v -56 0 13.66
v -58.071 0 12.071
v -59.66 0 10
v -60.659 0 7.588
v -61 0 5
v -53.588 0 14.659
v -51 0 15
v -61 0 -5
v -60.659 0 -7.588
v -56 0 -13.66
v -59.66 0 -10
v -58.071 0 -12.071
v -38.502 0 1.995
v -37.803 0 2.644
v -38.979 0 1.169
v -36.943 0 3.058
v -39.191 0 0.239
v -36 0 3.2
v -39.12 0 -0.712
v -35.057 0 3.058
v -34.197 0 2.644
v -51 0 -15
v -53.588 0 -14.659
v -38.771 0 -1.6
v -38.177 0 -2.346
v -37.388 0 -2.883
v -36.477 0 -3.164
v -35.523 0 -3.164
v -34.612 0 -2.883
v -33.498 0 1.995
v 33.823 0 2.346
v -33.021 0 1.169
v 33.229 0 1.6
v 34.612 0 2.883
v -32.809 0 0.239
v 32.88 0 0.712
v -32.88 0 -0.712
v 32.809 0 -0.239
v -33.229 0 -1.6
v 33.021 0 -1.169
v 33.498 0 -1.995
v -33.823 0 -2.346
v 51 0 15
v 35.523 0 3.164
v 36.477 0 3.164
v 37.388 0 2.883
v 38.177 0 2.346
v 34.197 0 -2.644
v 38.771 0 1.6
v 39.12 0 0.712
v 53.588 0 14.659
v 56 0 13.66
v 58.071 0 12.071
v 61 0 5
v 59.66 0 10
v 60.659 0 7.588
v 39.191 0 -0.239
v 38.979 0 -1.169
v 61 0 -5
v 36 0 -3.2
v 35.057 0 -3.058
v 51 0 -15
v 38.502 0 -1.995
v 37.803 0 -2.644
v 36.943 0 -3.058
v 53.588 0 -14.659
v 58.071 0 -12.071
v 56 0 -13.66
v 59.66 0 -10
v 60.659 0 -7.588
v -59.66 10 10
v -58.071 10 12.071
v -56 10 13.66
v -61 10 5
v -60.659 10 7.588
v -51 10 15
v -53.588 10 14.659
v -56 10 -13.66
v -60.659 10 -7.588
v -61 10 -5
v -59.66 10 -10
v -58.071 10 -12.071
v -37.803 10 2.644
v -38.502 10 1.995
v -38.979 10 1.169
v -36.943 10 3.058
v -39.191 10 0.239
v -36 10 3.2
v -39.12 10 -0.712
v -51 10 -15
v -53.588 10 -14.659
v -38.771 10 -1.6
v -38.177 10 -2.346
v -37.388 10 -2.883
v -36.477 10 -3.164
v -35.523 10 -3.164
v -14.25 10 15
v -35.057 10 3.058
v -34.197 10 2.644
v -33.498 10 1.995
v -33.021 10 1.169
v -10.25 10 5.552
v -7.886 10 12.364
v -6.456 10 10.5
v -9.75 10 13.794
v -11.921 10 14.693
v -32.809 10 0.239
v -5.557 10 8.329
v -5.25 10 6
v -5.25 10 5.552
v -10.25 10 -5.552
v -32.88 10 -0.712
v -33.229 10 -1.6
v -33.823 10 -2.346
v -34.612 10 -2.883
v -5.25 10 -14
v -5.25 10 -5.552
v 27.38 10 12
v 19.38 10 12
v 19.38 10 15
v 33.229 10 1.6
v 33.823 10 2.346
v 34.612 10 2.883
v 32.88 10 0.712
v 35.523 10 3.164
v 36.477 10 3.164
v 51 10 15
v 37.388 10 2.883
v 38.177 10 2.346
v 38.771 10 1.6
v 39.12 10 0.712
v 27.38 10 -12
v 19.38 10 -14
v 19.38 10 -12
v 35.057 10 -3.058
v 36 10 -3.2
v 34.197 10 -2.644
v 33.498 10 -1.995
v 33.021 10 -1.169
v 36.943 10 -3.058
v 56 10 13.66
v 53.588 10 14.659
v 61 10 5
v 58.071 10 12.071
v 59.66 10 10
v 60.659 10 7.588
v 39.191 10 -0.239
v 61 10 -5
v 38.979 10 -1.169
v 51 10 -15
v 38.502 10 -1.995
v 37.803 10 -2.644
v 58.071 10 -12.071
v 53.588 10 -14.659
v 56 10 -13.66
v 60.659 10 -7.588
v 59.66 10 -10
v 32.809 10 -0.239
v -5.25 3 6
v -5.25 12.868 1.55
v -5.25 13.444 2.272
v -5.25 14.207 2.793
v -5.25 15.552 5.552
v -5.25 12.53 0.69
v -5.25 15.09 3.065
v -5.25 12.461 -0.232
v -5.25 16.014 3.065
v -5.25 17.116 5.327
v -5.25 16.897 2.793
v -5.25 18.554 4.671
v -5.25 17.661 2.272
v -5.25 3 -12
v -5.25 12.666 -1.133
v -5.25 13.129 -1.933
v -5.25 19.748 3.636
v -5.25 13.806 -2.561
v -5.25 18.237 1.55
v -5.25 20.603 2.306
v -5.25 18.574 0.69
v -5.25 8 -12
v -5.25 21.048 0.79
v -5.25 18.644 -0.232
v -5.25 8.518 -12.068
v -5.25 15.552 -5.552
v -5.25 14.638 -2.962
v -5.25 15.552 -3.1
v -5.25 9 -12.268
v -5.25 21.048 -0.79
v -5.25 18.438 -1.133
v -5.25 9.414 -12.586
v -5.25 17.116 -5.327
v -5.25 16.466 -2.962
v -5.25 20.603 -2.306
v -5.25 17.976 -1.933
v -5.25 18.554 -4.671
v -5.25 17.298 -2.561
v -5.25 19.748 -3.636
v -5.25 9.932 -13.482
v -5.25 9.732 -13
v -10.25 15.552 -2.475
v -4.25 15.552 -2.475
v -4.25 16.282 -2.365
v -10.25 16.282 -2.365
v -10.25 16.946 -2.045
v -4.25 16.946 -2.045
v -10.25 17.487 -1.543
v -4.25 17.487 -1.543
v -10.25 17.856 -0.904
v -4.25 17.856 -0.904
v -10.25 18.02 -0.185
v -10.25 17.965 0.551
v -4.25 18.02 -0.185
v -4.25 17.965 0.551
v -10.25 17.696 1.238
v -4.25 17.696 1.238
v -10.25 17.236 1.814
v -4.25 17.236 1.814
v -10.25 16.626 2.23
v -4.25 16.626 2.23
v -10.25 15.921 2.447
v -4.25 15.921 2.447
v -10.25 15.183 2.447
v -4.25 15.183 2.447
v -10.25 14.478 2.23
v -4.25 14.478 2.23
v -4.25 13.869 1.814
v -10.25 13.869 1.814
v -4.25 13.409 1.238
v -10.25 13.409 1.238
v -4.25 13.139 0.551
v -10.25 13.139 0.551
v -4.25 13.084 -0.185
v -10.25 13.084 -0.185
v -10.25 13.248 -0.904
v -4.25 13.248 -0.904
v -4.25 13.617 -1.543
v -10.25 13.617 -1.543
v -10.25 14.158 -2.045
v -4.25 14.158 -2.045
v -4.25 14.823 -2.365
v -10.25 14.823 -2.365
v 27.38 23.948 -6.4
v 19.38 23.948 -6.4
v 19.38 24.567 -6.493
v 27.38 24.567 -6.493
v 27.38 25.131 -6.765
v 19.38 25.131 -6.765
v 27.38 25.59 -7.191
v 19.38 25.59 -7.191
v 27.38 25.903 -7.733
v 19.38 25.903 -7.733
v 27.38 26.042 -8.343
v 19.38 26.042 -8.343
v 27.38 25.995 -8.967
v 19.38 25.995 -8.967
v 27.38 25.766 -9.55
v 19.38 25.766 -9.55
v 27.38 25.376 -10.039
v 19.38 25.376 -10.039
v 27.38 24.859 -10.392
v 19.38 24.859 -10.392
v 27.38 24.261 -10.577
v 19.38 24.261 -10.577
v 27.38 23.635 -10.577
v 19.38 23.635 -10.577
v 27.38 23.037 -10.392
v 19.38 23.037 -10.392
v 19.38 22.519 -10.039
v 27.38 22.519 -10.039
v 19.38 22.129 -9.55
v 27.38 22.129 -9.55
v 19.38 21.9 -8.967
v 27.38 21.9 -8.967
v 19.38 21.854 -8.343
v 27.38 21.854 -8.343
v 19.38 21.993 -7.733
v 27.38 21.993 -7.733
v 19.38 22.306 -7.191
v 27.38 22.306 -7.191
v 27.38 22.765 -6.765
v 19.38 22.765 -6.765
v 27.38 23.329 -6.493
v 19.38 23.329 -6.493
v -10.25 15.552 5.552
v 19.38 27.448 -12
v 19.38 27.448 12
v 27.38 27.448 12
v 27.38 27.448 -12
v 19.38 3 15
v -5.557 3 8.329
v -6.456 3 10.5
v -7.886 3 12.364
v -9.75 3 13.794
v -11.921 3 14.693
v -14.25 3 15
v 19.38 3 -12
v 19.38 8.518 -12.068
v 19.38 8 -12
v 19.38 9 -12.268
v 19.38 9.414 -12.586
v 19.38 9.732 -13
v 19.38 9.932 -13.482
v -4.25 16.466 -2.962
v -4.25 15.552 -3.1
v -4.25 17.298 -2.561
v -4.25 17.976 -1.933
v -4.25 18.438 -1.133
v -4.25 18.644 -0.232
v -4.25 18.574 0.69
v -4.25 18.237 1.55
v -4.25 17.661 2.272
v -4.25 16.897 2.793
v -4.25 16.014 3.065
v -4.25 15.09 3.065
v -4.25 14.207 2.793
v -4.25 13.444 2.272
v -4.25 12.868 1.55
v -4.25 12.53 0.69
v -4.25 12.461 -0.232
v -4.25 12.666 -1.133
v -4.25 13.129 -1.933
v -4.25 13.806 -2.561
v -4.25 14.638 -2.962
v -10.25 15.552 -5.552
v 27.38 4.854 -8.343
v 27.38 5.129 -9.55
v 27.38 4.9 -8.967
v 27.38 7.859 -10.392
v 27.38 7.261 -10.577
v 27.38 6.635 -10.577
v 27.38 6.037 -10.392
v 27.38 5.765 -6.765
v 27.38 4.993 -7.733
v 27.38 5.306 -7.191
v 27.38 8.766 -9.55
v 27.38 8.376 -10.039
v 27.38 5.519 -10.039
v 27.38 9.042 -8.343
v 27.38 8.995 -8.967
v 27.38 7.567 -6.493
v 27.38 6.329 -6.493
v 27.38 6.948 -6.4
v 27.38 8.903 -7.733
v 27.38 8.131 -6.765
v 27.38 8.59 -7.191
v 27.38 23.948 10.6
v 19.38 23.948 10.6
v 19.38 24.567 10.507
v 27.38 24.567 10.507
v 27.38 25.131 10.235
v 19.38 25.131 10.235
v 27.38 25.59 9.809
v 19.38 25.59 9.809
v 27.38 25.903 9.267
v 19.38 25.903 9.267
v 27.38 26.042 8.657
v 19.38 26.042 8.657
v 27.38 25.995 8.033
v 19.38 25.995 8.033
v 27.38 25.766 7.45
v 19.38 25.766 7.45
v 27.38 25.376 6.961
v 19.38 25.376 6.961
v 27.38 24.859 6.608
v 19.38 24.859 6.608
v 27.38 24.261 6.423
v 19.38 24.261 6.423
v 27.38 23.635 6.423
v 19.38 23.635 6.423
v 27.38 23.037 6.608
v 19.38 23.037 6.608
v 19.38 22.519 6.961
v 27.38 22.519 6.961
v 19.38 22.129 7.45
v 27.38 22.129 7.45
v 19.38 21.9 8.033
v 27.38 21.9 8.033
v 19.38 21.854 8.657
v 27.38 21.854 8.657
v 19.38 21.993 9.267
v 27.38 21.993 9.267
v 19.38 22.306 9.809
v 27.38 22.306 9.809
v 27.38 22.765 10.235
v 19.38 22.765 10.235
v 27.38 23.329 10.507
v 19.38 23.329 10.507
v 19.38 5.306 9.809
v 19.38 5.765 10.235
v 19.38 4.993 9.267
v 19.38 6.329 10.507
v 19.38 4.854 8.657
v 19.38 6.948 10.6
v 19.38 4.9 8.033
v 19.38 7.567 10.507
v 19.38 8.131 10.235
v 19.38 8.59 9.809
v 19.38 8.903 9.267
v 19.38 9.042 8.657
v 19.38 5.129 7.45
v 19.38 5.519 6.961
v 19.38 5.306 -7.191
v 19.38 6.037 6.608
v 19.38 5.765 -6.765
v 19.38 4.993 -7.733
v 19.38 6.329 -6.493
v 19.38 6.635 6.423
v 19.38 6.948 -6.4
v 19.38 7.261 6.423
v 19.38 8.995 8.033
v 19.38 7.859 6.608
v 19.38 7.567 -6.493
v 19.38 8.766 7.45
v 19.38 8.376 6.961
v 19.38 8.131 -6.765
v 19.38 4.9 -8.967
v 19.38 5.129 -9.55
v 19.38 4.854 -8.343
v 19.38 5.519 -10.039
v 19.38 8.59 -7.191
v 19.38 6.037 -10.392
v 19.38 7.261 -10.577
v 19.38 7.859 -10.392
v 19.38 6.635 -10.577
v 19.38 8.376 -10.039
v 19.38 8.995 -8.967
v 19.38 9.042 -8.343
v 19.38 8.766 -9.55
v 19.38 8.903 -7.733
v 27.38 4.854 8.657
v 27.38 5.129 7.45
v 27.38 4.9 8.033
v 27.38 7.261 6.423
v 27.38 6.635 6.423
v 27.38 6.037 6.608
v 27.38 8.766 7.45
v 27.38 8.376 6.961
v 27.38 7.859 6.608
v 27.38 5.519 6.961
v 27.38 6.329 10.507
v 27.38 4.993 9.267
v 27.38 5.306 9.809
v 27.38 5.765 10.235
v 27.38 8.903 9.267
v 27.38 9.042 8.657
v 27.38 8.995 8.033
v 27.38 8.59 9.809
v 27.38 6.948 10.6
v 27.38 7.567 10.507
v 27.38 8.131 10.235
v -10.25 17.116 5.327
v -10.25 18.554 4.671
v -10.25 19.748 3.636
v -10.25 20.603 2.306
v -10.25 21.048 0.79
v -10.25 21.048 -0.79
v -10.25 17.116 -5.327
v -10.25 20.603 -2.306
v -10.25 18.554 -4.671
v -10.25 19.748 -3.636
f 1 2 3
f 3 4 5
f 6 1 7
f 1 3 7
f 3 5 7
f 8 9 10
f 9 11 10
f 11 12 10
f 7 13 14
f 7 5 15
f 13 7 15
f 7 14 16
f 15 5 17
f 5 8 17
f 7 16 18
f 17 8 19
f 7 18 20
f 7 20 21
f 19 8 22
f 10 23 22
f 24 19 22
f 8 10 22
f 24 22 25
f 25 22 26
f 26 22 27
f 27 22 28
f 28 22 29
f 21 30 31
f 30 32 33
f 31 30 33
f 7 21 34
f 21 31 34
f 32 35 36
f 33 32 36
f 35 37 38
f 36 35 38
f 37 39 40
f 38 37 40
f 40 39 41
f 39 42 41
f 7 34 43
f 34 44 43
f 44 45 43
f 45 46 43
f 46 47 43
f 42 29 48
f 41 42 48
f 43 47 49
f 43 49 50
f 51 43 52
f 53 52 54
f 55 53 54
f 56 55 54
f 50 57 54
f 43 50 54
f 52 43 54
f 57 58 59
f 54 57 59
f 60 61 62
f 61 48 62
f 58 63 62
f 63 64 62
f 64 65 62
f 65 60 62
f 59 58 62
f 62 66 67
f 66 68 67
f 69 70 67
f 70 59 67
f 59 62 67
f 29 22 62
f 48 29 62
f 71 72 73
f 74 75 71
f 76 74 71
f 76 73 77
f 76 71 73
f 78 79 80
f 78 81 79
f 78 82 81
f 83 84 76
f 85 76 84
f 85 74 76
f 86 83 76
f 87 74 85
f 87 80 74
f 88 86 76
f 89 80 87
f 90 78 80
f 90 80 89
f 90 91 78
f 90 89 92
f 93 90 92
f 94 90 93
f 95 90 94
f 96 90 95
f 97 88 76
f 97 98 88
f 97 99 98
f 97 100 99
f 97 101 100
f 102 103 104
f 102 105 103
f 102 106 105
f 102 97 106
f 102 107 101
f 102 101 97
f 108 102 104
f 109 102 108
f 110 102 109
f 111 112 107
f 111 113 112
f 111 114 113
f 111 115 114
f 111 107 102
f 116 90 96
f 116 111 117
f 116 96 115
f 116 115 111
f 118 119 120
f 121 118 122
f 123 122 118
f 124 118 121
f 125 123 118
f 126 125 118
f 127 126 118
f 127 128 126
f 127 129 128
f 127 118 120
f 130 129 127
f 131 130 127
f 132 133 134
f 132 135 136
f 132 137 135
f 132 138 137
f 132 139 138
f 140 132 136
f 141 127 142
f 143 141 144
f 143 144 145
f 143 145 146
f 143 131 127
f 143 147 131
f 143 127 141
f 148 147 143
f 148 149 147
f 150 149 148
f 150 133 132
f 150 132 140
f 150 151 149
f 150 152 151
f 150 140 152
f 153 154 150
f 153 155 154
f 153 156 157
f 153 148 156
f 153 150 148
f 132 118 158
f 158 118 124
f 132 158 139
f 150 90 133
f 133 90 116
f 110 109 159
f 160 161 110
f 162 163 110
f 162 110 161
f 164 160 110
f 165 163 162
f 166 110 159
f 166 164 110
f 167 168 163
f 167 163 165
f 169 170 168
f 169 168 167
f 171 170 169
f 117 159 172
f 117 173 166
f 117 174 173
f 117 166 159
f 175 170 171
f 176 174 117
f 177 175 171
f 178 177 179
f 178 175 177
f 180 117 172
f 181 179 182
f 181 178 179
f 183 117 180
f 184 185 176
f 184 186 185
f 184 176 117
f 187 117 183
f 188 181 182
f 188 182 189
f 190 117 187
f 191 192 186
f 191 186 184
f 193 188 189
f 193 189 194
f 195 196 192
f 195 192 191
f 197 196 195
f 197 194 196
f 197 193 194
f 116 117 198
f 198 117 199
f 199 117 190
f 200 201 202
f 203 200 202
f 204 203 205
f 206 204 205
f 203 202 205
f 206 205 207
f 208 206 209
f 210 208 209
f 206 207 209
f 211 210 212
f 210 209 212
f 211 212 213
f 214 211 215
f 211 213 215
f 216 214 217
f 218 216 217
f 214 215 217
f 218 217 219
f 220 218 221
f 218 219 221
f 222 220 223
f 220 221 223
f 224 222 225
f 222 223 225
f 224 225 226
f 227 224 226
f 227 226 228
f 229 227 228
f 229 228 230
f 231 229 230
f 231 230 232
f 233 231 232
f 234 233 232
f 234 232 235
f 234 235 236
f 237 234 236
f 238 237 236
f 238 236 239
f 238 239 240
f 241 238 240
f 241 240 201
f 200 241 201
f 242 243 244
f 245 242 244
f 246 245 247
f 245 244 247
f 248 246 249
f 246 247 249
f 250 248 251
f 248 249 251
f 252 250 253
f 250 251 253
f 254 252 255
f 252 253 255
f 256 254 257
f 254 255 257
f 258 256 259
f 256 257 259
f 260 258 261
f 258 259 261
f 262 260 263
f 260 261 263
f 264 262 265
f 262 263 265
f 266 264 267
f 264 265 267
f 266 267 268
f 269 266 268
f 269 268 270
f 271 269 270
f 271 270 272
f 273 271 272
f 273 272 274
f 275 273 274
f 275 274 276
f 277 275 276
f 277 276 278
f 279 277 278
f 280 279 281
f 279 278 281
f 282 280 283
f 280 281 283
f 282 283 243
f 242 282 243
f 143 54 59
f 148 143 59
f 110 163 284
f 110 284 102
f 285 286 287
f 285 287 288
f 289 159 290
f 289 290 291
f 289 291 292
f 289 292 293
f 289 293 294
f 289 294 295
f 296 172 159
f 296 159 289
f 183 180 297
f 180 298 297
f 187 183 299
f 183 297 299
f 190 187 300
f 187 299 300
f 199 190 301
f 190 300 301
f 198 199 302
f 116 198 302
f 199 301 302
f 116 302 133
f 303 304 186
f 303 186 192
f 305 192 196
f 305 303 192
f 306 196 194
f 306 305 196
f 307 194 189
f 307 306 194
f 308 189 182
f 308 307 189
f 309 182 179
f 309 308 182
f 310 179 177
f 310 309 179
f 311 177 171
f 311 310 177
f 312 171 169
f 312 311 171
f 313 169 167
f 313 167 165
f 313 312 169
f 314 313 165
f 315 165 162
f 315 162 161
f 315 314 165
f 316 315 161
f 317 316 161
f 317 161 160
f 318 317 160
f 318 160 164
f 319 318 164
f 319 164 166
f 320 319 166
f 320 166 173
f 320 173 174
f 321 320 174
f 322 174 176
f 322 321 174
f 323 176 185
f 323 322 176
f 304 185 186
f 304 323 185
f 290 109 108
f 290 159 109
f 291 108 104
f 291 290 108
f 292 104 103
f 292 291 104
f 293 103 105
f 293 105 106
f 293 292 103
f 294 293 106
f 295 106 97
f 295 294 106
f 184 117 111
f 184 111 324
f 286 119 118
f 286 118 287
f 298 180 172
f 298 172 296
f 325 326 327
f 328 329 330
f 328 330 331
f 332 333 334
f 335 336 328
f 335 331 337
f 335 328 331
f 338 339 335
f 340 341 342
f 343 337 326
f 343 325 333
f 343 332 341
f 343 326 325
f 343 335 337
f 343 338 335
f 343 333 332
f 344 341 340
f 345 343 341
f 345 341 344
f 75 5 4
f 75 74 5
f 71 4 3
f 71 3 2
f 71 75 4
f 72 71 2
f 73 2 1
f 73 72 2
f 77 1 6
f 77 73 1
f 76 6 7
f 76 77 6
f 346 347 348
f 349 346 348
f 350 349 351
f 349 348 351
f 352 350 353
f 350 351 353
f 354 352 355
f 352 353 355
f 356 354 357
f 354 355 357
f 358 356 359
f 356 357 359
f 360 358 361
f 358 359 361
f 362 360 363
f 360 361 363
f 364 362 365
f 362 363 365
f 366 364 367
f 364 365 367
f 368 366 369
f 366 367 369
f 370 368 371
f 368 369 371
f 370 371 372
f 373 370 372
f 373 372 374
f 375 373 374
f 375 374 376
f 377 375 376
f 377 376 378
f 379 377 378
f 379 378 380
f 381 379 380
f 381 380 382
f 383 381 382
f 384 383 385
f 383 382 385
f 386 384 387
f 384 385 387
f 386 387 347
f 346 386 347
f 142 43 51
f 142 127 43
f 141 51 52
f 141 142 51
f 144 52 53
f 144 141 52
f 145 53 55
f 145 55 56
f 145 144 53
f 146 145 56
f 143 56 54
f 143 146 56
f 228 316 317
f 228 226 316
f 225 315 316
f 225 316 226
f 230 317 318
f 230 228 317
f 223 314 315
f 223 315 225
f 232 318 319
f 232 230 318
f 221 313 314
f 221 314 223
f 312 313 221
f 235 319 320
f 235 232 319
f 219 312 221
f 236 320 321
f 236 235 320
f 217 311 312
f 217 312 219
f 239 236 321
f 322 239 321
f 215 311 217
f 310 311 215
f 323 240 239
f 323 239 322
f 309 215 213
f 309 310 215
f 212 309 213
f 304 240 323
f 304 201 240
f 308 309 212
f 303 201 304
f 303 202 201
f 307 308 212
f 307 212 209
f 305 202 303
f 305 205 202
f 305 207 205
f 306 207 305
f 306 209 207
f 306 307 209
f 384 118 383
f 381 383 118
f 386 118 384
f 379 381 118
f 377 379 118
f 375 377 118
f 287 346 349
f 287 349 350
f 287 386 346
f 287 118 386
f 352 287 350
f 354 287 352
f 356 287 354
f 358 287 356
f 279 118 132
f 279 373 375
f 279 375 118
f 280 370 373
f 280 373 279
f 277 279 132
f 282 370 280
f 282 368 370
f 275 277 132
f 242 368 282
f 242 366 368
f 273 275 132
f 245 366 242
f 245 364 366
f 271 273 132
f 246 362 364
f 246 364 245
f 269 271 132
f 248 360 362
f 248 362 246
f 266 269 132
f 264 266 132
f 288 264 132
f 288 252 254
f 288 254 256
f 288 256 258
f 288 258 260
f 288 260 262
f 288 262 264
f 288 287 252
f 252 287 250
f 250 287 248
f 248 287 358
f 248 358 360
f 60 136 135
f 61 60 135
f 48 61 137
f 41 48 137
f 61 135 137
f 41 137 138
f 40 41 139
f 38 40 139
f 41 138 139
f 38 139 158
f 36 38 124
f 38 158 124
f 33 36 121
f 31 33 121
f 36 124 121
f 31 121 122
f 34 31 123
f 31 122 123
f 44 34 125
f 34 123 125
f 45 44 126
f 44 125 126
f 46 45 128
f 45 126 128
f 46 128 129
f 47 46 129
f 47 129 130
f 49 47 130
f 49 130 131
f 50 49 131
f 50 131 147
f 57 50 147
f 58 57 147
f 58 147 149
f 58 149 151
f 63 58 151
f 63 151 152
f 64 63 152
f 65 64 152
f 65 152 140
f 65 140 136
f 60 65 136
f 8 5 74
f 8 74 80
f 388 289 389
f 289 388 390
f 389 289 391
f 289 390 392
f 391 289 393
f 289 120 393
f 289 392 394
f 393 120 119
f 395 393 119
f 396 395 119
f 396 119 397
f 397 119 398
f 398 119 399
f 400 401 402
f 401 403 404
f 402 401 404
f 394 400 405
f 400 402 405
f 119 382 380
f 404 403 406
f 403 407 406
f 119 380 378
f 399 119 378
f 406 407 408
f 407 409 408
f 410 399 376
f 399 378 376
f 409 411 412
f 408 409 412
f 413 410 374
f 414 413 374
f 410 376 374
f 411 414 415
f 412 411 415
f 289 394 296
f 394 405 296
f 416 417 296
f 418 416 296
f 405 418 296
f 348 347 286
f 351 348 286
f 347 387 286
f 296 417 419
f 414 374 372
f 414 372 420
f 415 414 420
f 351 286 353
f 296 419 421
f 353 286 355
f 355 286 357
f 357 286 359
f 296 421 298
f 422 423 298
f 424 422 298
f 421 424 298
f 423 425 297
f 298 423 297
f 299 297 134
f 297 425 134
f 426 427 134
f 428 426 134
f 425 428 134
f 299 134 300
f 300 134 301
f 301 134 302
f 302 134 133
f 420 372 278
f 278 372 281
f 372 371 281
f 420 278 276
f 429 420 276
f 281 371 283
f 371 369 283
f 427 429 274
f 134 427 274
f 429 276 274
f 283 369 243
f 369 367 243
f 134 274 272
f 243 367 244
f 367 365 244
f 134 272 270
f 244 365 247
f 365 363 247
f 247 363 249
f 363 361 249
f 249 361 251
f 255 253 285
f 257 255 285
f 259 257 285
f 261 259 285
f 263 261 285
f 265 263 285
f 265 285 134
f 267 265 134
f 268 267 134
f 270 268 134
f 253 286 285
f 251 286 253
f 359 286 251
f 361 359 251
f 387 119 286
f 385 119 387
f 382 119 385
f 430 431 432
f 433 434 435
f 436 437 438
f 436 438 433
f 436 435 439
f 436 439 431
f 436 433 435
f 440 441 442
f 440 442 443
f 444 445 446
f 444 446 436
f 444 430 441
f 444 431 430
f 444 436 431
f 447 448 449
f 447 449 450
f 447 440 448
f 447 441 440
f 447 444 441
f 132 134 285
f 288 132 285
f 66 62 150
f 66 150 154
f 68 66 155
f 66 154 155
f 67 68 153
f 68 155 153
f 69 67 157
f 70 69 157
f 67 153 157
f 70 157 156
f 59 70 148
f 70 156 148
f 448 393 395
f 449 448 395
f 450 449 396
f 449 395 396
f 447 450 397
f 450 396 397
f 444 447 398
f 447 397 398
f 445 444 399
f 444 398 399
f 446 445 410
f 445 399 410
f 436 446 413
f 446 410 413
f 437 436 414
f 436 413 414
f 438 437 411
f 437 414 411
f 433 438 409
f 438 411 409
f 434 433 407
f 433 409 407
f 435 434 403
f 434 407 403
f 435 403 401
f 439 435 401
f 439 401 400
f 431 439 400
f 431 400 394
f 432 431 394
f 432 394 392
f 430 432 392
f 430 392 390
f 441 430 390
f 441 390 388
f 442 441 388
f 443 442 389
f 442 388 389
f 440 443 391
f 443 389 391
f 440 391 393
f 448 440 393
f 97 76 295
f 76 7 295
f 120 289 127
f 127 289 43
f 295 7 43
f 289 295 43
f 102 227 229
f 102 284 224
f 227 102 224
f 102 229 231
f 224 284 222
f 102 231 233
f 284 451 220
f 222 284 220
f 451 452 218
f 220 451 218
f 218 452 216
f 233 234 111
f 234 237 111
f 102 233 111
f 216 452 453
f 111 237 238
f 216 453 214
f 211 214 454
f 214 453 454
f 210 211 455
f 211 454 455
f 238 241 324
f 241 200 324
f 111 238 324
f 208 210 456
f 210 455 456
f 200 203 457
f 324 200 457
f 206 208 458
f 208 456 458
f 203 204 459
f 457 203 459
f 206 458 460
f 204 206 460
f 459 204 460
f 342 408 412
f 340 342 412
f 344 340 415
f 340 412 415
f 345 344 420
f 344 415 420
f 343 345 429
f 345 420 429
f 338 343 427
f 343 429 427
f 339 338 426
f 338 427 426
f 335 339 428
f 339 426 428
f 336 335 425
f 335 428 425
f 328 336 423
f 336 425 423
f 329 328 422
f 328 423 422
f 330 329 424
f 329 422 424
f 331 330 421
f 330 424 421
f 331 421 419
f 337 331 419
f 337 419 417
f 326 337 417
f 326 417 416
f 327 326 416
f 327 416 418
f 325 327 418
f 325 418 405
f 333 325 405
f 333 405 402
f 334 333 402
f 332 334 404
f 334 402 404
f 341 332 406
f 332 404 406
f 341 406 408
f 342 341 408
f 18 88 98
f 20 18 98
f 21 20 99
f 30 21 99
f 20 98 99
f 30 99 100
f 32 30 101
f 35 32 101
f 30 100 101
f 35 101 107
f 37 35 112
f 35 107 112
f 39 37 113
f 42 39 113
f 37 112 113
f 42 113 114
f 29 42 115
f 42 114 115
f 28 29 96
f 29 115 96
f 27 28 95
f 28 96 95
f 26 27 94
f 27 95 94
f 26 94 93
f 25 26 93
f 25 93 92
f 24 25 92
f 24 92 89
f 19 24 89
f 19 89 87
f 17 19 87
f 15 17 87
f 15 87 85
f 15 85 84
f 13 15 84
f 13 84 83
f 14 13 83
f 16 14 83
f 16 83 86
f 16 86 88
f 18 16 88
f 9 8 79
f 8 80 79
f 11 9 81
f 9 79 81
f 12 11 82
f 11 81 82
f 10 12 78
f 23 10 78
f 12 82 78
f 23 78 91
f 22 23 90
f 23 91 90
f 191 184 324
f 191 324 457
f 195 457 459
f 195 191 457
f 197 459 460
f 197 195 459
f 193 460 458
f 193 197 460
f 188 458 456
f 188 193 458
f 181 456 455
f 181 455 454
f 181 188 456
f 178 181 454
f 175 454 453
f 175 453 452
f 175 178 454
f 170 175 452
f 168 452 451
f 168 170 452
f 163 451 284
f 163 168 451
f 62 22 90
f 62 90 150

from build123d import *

# Parameters (mm, degrees)
SKETCH1_W           = 122
SKETCH1_H           = 30
BOSS_EXTRUDE1_DEPTH = 10
SKETCH2_W           = 24
SKETCH2_H           = 17.447802
BOSS_EXTRUDE2_DEPTH = 8
SKETCH3_R           = 2.475
BOSS_EXTRUDE3_DEPTH = 5
SKETCH4_W           = 24.63
SKETCH4_H           = 27
CUT_EXTRUDE1_DEPTH  = 7
FILLET1_R           = 10
SKETCH7_R           = 3.2
CUT_EXTRUDE2_DEPTH  = 66.195289666
BOSS_EXTRUDE5_START = 1
SKETCH8_R           = 3.1
SKETCH8_R_2         = 2.475
BOSS_EXTRUDE5_DEPTH = 1
FILLET2_R           = 9
FILLET3_R           = 2
SKETCH9_R           = 2.1
CUT_EXTRUDE3_DEPTH  = 8


with BuildPart() as part:
    # Sketch1 → Boss-Extrude1 (new body)
    with BuildSketch(Plane(origin=(0, 0, 0), x_dir=(1, 0, 0), z_dir=(0, 1, 0))):
        Rectangle(SKETCH1_W, SKETCH1_H)
    extrude(amount=BOSS_EXTRUDE1_DEPTH)

    # Sketch2 → Boss-Extrude2 (add)
    with BuildSketch(Plane(origin=(19.38, 0, 0), x_dir=(0, 0, -1), z_dir=(1, 0, 0))):
        with Locations((0, 18.723901)):
            Rectangle(SKETCH2_W, SKETCH2_H)
    extrude(amount=BOSS_EXTRUDE2_DEPTH)

    # Sketch3 → Boss-Extrude3 (add)
    with BuildSketch(Plane(origin=(-5.25, 0, 0), x_dir=(0, 0, -1), z_dir=(1, 0, 0))):
        with BuildLine():
            Line((-5.552198, 15.552198), (-5.552198, 10))
            Line((-5.552198, 10), (5.552198, 10))
            Line((5.552198, 10), (5.552198, 15.552198))
            ThreePointArc((5.552198, 15.552198), (0, 21.104396), (-5.552198, 15.552198))
        make_face()
        with Locations((0, 15.552198)):
            Circle(SKETCH3_R, mode=Mode.SUBTRACT)
    extrude(amount=-BOSS_EXTRUDE3_DEPTH)

    # Sketch4 → Cut-Extrude1 (cut)
    with BuildSketch(Plane(origin=(0, 10, 0), x_dir=(1, 0, 0), z_dir=(0, 1, 0))):
        with Locations((7.065, -1.5)):
            Rectangle(SKETCH4_W, SKETCH4_H)
    extrude(amount=-CUT_EXTRUDE1_DEPTH, mode=Mode.SUBTRACT)

    # Fillet1
    fillet1_edges = [part.edges().sort_by_distance(p)[0] for p in [
        (61, 5, 15),
        (-61, 5, 15),
        (-61, 5, -15),
        (61, 5, -15),
    ]]
    fillet(fillet1_edges, radius=FILLET1_R)

    # Sketch7 → Cut-Extrude2 (cut, through all)
    with BuildSketch(Plane(origin=(0, 10, 0), x_dir=(1, 0, 0), z_dir=(0, 1, 0))):
        with Locations(Location((-36, 0, 0), (0, 0, 270))):
            Circle(SKETCH7_R)
        with Locations(Location((36, 0, 0), (0, 0, 90))):
            Circle(SKETCH7_R)
    extrude(amount=-CUT_EXTRUDE2_DEPTH, mode=Mode.SUBTRACT)

    # Sketch8 → Boss-Extrude5 (add)
    with BuildSketch(Plane(origin=(-5.25, 0, 0), x_dir=(0, 0, -1), z_dir=(1, 0, 0)).offset(BOSS_EXTRUDE5_START)):
        with Locations((0, 15.552198)):
            Circle(SKETCH8_R)
        with Locations((0, 15.552198)):
            Circle(SKETCH8_R_2, mode=Mode.SUBTRACT)
    extrude(amount=-BOSS_EXTRUDE5_DEPTH)

    # Fillet2
    fillet2_edges = [part.edges().sort_by_distance(p)[0] for p in [
        (-5.25, 6.5, 15),
    ]]
    fillet(fillet2_edges, radius=FILLET2_R)

    # Fillet3
    fillet3_edges = [part.edges().sort_by_distance(p)[0] for p in [
        (7.065, 10, -12),
    ]]
    fillet(fillet3_edges, radius=FILLET3_R)

    # Sketch9 → Cut-Extrude3 (cut)
    with BuildSketch(Plane.ZY.offset(-19.38)):
        with Locations((8.5, 23.947802)):
            Circle(SKETCH9_R)
        with Locations((8.5, 6.947802)):
            Circle(SKETCH9_R)
        with Locations((-8.5, 6.947802)):
            Circle(SKETCH9_R)
        with Locations((-8.5, 23.947802)):
            Circle(SKETCH9_R)
    extrude(amount=-CUT_EXTRUDE3_DEPTH, mode=Mode.SUBTRACT)


solid = part.part
